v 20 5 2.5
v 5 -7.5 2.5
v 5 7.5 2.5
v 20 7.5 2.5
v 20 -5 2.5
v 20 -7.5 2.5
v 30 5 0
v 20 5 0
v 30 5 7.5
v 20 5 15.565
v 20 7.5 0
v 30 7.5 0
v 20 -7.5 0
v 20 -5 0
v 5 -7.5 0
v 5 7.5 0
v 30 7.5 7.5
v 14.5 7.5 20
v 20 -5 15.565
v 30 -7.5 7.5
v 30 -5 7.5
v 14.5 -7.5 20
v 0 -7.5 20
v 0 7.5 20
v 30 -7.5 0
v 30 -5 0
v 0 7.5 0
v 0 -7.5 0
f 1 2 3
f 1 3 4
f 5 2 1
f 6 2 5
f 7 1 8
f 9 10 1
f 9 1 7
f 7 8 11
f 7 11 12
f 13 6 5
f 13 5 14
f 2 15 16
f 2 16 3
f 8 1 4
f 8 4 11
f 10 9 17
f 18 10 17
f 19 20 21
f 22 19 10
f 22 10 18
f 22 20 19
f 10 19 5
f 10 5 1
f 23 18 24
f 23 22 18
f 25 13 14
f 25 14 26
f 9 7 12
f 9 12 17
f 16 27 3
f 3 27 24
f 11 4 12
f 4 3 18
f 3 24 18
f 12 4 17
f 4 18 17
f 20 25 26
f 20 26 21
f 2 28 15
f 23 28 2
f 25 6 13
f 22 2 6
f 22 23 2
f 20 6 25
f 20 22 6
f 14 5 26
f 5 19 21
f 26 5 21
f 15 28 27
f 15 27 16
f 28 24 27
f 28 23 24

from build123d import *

# Parameters (mm, degrees)
F1_DEPTH = 7.5
F2_W     = 10
F2_H     = 10
F3_DEPTH = 20.001


with BuildPart() as f1:
    # F0 (on Front) → F1 (new body, symmetric)
    with BuildSketch(Plane.XZ):
        Polygon((0, 20), (0, 0), (5, 0), (5, 2.5), (20, 2.5), (20, 0), (30, 0), (30, 7.5), (14.5, 20), align=None)
    extrude(amount=F1_DEPTH, both=True)

    # F2 (on face) → F3 (cut, through all)
    with BuildSketch(Plane.XY.offset(20)):
        with Locations((25, 0)):
            Rectangle(F2_W, F2_H)
    extrude(amount=-F3_DEPTH, mode=Mode.SUBTRACT)


solid = f1.part
